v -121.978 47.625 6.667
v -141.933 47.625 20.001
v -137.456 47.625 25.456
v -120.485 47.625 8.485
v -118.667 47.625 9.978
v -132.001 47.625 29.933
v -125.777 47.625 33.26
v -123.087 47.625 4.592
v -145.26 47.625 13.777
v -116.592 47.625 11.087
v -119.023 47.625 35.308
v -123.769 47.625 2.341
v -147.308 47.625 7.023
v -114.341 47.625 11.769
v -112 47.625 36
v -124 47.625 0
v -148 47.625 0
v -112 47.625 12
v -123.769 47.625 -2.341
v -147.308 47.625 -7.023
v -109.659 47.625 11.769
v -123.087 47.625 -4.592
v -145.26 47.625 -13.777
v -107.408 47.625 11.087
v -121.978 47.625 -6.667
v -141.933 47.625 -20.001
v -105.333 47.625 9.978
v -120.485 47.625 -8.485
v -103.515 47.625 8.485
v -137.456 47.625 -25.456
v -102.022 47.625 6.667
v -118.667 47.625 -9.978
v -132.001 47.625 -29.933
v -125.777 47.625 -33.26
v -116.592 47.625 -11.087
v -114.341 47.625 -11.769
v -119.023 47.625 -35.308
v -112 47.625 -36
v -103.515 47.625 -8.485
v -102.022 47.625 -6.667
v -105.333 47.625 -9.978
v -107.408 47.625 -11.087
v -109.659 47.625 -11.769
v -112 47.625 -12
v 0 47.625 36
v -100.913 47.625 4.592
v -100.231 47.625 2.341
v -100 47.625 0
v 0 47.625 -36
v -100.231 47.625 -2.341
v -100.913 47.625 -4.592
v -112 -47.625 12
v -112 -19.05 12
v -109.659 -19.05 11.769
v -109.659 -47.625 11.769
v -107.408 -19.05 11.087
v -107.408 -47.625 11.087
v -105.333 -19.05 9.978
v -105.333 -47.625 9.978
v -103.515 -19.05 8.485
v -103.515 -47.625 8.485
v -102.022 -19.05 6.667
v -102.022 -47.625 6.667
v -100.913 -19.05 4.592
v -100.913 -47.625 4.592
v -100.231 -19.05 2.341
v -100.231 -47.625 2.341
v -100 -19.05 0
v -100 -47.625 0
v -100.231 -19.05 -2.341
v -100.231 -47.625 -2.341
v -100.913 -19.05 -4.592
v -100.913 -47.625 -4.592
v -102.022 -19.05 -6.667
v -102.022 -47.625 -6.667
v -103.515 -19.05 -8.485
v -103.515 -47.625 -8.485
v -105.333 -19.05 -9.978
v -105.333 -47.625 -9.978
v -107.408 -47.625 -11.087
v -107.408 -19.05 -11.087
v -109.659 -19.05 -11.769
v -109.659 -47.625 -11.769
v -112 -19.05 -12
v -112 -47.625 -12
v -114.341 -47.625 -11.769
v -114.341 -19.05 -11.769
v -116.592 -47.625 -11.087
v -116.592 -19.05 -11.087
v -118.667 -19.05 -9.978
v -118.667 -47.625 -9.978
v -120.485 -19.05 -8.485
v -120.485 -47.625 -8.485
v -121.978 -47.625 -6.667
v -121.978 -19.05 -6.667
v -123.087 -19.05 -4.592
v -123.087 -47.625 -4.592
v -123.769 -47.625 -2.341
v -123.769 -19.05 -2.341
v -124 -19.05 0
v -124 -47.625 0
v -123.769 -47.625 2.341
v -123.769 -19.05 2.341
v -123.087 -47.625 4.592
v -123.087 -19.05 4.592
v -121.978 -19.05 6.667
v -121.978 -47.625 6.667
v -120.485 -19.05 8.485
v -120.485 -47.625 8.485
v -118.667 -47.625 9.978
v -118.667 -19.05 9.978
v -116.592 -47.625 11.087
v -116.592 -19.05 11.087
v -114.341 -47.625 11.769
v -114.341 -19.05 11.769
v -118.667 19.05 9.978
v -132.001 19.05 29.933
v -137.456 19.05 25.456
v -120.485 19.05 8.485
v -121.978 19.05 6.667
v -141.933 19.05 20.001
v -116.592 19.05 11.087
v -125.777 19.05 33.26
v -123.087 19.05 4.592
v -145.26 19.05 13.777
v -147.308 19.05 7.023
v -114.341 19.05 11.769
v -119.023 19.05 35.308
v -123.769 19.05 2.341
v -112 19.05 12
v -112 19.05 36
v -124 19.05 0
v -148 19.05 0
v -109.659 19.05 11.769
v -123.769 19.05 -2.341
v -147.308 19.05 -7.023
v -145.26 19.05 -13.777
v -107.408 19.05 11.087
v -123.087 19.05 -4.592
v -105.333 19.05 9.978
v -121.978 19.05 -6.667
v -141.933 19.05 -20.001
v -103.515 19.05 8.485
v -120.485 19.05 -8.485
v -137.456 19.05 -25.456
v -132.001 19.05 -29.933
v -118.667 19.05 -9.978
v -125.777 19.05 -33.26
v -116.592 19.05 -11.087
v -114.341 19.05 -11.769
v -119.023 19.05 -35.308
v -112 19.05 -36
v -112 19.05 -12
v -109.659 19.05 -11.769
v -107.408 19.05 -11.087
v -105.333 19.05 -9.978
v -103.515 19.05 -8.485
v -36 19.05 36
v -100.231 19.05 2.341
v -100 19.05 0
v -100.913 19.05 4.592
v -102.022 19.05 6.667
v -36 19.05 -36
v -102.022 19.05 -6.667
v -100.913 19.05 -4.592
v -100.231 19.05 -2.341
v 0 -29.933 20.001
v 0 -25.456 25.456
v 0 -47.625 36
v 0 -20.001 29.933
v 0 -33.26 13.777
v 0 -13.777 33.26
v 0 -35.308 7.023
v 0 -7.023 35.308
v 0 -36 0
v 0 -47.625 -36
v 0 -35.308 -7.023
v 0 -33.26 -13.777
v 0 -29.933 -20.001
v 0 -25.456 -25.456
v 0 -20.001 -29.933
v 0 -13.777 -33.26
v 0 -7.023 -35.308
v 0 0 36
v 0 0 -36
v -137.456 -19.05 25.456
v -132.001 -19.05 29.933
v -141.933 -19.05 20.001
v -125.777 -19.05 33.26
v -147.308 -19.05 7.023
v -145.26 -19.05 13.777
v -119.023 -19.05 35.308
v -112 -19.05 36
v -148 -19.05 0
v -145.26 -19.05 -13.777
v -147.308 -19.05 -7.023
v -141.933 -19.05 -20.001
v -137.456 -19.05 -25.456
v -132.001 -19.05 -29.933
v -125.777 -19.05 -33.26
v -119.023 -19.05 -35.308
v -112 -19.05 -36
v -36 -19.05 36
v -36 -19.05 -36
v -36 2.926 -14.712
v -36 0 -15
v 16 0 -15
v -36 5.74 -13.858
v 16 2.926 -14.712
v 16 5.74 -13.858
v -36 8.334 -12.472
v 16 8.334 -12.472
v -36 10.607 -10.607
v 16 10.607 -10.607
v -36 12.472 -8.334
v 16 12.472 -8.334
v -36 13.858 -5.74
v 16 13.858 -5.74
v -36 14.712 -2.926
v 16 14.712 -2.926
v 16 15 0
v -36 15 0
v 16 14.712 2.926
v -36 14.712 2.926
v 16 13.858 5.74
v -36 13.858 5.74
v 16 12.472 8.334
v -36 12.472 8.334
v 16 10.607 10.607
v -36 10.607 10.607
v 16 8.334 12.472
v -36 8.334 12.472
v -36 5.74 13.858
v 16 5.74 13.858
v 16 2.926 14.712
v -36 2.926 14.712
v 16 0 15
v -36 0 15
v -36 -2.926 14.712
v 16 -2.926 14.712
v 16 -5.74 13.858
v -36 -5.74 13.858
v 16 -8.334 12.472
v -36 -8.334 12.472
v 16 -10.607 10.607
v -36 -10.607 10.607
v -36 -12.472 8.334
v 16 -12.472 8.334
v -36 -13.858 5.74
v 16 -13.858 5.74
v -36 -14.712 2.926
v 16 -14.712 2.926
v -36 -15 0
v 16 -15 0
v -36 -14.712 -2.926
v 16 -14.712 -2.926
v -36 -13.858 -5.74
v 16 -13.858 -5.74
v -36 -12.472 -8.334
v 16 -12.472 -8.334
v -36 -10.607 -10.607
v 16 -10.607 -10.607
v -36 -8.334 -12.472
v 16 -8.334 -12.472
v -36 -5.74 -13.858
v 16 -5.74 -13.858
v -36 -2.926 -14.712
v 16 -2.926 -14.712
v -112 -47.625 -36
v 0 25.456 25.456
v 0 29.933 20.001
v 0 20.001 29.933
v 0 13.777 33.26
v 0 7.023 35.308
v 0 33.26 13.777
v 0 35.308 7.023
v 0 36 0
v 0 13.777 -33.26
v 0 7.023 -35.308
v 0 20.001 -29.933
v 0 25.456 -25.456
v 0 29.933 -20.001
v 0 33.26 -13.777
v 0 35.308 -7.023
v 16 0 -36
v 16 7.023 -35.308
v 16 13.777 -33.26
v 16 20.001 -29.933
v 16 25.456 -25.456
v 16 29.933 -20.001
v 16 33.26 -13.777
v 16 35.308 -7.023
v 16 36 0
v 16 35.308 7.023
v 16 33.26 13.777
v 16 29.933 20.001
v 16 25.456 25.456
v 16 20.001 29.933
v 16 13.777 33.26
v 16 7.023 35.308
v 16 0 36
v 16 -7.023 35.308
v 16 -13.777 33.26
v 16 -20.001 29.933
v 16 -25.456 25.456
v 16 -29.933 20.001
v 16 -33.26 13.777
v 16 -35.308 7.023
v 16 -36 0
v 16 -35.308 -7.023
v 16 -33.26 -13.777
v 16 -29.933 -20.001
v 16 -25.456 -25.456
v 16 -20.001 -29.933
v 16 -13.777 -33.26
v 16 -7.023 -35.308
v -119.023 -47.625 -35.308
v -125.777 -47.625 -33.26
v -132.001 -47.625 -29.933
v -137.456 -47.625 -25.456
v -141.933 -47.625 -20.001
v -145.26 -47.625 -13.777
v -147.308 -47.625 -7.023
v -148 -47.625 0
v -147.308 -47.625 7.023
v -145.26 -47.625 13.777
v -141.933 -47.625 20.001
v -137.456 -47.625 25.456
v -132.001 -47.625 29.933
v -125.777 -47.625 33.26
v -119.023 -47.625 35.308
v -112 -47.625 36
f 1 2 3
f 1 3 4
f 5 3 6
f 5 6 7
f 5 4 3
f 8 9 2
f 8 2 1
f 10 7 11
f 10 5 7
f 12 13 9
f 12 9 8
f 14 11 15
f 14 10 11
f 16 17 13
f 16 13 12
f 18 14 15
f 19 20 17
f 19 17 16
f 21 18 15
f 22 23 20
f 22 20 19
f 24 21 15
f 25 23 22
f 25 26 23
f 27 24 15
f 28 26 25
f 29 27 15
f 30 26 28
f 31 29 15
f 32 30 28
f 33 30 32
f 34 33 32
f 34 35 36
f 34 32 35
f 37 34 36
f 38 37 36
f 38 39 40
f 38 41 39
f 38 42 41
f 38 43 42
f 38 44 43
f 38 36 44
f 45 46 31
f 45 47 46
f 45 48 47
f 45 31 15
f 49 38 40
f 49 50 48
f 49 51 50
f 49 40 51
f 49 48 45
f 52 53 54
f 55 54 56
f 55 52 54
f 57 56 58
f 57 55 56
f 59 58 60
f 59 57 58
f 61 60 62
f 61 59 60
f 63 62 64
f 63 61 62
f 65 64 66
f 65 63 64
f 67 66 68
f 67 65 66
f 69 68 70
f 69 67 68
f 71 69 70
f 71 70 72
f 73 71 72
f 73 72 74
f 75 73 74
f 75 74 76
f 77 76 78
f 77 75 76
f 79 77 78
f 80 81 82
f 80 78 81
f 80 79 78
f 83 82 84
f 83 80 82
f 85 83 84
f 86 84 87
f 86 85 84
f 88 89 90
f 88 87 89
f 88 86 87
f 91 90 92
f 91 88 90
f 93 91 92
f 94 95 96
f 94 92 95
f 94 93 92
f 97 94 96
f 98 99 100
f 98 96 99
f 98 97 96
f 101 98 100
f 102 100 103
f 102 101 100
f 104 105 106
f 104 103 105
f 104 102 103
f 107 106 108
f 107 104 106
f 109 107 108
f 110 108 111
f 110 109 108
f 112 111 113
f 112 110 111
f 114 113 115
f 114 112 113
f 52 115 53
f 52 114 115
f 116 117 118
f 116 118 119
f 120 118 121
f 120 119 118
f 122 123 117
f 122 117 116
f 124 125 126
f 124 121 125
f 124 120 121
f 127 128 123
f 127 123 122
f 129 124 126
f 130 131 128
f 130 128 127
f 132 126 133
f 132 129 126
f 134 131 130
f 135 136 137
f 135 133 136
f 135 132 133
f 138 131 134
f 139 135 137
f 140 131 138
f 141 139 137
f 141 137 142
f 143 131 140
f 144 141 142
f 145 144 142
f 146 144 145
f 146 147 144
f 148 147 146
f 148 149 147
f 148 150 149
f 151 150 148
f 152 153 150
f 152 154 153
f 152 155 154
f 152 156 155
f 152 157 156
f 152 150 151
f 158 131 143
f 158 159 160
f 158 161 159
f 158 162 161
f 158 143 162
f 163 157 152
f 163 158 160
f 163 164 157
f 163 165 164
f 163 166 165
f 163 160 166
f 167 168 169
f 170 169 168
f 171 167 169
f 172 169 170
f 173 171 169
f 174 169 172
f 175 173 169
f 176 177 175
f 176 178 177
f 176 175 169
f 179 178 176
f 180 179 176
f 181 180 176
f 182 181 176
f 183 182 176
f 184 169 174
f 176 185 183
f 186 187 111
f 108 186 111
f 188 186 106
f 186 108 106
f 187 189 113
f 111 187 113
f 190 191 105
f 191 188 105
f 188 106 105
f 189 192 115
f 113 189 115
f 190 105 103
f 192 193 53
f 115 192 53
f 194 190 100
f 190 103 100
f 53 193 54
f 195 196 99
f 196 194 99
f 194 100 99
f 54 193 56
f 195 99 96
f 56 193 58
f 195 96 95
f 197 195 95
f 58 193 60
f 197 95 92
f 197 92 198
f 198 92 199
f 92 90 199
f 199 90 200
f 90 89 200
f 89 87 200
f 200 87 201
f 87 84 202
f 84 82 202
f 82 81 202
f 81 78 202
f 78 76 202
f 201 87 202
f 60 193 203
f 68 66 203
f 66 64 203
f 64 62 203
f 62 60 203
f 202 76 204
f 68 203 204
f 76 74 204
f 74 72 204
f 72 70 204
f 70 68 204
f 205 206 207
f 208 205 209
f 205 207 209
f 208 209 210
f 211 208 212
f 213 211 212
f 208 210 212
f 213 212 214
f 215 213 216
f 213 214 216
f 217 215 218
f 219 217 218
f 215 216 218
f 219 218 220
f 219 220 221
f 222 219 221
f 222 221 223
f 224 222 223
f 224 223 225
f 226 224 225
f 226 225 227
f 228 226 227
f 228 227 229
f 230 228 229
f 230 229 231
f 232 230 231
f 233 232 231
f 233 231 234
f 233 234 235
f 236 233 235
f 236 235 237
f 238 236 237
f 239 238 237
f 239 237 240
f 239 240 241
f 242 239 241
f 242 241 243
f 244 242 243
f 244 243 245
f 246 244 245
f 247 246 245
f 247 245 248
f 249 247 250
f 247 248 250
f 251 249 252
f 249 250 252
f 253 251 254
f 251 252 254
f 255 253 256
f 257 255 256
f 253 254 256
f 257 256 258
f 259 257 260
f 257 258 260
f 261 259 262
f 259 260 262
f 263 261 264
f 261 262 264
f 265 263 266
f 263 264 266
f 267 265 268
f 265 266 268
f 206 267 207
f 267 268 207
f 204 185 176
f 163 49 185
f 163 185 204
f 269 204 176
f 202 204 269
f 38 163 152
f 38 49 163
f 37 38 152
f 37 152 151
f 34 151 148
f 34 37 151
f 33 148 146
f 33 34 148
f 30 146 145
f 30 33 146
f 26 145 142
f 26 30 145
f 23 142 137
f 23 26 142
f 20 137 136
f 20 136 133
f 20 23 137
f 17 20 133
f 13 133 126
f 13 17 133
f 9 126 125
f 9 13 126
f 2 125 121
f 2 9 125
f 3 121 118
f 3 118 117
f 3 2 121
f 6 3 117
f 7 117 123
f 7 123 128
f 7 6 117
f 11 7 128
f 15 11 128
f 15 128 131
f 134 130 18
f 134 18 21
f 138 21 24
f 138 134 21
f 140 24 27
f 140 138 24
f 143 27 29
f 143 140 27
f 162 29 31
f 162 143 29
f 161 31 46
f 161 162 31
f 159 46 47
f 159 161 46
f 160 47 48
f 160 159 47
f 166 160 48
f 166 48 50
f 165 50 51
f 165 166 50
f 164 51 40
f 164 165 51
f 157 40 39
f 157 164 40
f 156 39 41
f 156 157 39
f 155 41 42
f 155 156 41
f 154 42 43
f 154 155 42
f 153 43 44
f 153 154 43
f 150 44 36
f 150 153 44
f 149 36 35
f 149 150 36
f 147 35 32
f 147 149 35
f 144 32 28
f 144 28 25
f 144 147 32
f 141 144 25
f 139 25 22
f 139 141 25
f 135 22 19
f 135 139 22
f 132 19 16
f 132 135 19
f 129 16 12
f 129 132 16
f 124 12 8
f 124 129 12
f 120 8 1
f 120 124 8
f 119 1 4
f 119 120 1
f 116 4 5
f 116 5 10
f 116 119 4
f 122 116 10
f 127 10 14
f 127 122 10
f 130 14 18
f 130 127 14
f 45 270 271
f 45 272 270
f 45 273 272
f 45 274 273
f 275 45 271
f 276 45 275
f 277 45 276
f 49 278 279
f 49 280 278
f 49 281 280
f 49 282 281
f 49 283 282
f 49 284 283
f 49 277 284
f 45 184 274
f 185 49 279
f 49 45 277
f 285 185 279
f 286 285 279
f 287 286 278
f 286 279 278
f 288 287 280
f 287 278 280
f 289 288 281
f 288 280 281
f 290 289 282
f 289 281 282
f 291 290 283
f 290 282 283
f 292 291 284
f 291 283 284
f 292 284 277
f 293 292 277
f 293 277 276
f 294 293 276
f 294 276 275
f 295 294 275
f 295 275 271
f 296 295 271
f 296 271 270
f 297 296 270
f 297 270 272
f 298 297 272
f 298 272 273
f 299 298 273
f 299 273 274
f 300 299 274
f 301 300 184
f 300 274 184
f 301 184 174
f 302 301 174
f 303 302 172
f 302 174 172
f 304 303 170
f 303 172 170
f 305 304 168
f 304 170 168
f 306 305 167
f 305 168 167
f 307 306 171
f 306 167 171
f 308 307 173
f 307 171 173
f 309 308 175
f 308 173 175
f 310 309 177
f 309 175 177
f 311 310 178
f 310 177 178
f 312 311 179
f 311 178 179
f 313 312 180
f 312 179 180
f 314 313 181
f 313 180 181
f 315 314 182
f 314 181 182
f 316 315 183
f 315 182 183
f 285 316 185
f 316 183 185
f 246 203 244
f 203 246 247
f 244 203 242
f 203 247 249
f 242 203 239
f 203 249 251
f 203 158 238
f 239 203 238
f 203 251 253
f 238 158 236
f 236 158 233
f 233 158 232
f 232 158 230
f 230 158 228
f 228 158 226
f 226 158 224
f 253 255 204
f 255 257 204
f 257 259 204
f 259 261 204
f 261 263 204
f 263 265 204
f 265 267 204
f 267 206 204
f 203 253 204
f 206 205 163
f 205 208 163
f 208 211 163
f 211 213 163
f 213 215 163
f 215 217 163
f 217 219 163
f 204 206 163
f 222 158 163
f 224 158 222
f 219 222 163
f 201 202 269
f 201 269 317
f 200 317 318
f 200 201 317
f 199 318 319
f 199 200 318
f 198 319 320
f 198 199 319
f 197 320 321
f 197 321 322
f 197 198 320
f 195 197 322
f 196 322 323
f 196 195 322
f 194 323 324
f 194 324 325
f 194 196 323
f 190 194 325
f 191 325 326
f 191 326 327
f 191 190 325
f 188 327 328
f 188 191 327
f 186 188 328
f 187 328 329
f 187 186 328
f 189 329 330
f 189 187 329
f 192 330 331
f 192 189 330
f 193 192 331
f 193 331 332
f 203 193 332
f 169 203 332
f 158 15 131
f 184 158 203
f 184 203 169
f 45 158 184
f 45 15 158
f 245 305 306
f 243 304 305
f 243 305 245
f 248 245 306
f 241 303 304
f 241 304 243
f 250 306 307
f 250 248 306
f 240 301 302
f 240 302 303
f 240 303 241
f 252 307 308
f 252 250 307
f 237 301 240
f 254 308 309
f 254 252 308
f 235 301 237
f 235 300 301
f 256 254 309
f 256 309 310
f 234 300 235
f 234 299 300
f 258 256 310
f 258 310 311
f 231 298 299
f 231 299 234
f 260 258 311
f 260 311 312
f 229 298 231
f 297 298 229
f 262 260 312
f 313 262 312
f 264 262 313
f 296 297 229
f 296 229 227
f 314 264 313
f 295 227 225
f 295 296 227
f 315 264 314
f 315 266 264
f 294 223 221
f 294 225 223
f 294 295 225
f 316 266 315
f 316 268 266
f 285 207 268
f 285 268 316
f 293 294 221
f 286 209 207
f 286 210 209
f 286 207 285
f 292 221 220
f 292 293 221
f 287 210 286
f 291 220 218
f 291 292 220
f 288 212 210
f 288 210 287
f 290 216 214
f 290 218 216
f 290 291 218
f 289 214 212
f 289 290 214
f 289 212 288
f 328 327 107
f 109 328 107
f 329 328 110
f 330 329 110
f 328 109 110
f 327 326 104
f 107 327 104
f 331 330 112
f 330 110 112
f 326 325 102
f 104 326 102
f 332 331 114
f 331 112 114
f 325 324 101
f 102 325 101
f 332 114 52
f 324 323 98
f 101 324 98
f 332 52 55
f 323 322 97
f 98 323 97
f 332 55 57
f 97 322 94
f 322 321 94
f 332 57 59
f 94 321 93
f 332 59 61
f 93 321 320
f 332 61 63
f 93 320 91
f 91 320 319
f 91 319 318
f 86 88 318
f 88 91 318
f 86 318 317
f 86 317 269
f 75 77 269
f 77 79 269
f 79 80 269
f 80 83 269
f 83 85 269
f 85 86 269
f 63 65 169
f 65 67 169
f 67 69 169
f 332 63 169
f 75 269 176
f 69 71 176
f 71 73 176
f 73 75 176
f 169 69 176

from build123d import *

# Parameters (mm, degrees)
SKETCH1_R           = 12
BOSS_EXTRUDE1_DEPTH = 47.625
CUT_EXTRUDE1_START  = -36
SKETCH2_W           = 72
SKETCH2_H           = 38.1
CUT_EXTRUDE1_DEPTH  = 124.587407476
SKETCH3_R           = 36
BOSS_EXTRUDE2_DEPTH = 16
SKETCH4_R           = 15
CUT_EXTRUDE2_DEPTH  = 175.528337599


with BuildPart() as part:
    # Sketch1 → Boss-Extrude1 (new, symmetric)
    with BuildSketch(Plane(origin=(0, 0, 0), x_dir=(1, 0, 0), z_dir=(0, 1, 0))):
        with BuildLine():
            Line((0, -36), (0, 36))
            Line((0, 36), (-112, 36))
            ThreePointArc((-112, 36), (-148, 0), (-112, -36))
            Line((-112, -36), (0, -36))
        make_face()
        with Locations(Location((-112, 0, 0), (0, 0, 270))):
            Circle(SKETCH1_R, mode=Mode.SUBTRACT)
    extrude(amount=BOSS_EXTRUDE1_DEPTH, both=True)

    # Sketch2 → Cut-Extrude1 (cut, through all)
    with BuildSketch(Plane(origin=(0, 0, 0), x_dir=(0, 0, -1), z_dir=(1, 0, 0)).offset(CUT_EXTRUDE1_START)):
        Rectangle(SKETCH2_W, SKETCH2_H)
    extrude(amount=-CUT_EXTRUDE1_DEPTH, mode=Mode.SUBTRACT)

    # Sketch3 → Boss-Extrude2 (add)
    with BuildSketch(Plane(origin=(0, 0, 0), x_dir=(0, 0, -1), z_dir=(1, 0, 0))):
        Circle(SKETCH3_R)
    extrude(amount=BOSS_EXTRUDE2_DEPTH)

    # Sketch4 → Cut-Extrude2 (cut, through all)
    with BuildSketch(Plane(origin=(16, 0, 0), x_dir=(0, 0, -1), z_dir=(1, 0, 0))):
        Circle(SKETCH4_R)
    extrude(amount=-CUT_EXTRUDE2_DEPTH, mode=Mode.SUBTRACT)


solid = part.part
